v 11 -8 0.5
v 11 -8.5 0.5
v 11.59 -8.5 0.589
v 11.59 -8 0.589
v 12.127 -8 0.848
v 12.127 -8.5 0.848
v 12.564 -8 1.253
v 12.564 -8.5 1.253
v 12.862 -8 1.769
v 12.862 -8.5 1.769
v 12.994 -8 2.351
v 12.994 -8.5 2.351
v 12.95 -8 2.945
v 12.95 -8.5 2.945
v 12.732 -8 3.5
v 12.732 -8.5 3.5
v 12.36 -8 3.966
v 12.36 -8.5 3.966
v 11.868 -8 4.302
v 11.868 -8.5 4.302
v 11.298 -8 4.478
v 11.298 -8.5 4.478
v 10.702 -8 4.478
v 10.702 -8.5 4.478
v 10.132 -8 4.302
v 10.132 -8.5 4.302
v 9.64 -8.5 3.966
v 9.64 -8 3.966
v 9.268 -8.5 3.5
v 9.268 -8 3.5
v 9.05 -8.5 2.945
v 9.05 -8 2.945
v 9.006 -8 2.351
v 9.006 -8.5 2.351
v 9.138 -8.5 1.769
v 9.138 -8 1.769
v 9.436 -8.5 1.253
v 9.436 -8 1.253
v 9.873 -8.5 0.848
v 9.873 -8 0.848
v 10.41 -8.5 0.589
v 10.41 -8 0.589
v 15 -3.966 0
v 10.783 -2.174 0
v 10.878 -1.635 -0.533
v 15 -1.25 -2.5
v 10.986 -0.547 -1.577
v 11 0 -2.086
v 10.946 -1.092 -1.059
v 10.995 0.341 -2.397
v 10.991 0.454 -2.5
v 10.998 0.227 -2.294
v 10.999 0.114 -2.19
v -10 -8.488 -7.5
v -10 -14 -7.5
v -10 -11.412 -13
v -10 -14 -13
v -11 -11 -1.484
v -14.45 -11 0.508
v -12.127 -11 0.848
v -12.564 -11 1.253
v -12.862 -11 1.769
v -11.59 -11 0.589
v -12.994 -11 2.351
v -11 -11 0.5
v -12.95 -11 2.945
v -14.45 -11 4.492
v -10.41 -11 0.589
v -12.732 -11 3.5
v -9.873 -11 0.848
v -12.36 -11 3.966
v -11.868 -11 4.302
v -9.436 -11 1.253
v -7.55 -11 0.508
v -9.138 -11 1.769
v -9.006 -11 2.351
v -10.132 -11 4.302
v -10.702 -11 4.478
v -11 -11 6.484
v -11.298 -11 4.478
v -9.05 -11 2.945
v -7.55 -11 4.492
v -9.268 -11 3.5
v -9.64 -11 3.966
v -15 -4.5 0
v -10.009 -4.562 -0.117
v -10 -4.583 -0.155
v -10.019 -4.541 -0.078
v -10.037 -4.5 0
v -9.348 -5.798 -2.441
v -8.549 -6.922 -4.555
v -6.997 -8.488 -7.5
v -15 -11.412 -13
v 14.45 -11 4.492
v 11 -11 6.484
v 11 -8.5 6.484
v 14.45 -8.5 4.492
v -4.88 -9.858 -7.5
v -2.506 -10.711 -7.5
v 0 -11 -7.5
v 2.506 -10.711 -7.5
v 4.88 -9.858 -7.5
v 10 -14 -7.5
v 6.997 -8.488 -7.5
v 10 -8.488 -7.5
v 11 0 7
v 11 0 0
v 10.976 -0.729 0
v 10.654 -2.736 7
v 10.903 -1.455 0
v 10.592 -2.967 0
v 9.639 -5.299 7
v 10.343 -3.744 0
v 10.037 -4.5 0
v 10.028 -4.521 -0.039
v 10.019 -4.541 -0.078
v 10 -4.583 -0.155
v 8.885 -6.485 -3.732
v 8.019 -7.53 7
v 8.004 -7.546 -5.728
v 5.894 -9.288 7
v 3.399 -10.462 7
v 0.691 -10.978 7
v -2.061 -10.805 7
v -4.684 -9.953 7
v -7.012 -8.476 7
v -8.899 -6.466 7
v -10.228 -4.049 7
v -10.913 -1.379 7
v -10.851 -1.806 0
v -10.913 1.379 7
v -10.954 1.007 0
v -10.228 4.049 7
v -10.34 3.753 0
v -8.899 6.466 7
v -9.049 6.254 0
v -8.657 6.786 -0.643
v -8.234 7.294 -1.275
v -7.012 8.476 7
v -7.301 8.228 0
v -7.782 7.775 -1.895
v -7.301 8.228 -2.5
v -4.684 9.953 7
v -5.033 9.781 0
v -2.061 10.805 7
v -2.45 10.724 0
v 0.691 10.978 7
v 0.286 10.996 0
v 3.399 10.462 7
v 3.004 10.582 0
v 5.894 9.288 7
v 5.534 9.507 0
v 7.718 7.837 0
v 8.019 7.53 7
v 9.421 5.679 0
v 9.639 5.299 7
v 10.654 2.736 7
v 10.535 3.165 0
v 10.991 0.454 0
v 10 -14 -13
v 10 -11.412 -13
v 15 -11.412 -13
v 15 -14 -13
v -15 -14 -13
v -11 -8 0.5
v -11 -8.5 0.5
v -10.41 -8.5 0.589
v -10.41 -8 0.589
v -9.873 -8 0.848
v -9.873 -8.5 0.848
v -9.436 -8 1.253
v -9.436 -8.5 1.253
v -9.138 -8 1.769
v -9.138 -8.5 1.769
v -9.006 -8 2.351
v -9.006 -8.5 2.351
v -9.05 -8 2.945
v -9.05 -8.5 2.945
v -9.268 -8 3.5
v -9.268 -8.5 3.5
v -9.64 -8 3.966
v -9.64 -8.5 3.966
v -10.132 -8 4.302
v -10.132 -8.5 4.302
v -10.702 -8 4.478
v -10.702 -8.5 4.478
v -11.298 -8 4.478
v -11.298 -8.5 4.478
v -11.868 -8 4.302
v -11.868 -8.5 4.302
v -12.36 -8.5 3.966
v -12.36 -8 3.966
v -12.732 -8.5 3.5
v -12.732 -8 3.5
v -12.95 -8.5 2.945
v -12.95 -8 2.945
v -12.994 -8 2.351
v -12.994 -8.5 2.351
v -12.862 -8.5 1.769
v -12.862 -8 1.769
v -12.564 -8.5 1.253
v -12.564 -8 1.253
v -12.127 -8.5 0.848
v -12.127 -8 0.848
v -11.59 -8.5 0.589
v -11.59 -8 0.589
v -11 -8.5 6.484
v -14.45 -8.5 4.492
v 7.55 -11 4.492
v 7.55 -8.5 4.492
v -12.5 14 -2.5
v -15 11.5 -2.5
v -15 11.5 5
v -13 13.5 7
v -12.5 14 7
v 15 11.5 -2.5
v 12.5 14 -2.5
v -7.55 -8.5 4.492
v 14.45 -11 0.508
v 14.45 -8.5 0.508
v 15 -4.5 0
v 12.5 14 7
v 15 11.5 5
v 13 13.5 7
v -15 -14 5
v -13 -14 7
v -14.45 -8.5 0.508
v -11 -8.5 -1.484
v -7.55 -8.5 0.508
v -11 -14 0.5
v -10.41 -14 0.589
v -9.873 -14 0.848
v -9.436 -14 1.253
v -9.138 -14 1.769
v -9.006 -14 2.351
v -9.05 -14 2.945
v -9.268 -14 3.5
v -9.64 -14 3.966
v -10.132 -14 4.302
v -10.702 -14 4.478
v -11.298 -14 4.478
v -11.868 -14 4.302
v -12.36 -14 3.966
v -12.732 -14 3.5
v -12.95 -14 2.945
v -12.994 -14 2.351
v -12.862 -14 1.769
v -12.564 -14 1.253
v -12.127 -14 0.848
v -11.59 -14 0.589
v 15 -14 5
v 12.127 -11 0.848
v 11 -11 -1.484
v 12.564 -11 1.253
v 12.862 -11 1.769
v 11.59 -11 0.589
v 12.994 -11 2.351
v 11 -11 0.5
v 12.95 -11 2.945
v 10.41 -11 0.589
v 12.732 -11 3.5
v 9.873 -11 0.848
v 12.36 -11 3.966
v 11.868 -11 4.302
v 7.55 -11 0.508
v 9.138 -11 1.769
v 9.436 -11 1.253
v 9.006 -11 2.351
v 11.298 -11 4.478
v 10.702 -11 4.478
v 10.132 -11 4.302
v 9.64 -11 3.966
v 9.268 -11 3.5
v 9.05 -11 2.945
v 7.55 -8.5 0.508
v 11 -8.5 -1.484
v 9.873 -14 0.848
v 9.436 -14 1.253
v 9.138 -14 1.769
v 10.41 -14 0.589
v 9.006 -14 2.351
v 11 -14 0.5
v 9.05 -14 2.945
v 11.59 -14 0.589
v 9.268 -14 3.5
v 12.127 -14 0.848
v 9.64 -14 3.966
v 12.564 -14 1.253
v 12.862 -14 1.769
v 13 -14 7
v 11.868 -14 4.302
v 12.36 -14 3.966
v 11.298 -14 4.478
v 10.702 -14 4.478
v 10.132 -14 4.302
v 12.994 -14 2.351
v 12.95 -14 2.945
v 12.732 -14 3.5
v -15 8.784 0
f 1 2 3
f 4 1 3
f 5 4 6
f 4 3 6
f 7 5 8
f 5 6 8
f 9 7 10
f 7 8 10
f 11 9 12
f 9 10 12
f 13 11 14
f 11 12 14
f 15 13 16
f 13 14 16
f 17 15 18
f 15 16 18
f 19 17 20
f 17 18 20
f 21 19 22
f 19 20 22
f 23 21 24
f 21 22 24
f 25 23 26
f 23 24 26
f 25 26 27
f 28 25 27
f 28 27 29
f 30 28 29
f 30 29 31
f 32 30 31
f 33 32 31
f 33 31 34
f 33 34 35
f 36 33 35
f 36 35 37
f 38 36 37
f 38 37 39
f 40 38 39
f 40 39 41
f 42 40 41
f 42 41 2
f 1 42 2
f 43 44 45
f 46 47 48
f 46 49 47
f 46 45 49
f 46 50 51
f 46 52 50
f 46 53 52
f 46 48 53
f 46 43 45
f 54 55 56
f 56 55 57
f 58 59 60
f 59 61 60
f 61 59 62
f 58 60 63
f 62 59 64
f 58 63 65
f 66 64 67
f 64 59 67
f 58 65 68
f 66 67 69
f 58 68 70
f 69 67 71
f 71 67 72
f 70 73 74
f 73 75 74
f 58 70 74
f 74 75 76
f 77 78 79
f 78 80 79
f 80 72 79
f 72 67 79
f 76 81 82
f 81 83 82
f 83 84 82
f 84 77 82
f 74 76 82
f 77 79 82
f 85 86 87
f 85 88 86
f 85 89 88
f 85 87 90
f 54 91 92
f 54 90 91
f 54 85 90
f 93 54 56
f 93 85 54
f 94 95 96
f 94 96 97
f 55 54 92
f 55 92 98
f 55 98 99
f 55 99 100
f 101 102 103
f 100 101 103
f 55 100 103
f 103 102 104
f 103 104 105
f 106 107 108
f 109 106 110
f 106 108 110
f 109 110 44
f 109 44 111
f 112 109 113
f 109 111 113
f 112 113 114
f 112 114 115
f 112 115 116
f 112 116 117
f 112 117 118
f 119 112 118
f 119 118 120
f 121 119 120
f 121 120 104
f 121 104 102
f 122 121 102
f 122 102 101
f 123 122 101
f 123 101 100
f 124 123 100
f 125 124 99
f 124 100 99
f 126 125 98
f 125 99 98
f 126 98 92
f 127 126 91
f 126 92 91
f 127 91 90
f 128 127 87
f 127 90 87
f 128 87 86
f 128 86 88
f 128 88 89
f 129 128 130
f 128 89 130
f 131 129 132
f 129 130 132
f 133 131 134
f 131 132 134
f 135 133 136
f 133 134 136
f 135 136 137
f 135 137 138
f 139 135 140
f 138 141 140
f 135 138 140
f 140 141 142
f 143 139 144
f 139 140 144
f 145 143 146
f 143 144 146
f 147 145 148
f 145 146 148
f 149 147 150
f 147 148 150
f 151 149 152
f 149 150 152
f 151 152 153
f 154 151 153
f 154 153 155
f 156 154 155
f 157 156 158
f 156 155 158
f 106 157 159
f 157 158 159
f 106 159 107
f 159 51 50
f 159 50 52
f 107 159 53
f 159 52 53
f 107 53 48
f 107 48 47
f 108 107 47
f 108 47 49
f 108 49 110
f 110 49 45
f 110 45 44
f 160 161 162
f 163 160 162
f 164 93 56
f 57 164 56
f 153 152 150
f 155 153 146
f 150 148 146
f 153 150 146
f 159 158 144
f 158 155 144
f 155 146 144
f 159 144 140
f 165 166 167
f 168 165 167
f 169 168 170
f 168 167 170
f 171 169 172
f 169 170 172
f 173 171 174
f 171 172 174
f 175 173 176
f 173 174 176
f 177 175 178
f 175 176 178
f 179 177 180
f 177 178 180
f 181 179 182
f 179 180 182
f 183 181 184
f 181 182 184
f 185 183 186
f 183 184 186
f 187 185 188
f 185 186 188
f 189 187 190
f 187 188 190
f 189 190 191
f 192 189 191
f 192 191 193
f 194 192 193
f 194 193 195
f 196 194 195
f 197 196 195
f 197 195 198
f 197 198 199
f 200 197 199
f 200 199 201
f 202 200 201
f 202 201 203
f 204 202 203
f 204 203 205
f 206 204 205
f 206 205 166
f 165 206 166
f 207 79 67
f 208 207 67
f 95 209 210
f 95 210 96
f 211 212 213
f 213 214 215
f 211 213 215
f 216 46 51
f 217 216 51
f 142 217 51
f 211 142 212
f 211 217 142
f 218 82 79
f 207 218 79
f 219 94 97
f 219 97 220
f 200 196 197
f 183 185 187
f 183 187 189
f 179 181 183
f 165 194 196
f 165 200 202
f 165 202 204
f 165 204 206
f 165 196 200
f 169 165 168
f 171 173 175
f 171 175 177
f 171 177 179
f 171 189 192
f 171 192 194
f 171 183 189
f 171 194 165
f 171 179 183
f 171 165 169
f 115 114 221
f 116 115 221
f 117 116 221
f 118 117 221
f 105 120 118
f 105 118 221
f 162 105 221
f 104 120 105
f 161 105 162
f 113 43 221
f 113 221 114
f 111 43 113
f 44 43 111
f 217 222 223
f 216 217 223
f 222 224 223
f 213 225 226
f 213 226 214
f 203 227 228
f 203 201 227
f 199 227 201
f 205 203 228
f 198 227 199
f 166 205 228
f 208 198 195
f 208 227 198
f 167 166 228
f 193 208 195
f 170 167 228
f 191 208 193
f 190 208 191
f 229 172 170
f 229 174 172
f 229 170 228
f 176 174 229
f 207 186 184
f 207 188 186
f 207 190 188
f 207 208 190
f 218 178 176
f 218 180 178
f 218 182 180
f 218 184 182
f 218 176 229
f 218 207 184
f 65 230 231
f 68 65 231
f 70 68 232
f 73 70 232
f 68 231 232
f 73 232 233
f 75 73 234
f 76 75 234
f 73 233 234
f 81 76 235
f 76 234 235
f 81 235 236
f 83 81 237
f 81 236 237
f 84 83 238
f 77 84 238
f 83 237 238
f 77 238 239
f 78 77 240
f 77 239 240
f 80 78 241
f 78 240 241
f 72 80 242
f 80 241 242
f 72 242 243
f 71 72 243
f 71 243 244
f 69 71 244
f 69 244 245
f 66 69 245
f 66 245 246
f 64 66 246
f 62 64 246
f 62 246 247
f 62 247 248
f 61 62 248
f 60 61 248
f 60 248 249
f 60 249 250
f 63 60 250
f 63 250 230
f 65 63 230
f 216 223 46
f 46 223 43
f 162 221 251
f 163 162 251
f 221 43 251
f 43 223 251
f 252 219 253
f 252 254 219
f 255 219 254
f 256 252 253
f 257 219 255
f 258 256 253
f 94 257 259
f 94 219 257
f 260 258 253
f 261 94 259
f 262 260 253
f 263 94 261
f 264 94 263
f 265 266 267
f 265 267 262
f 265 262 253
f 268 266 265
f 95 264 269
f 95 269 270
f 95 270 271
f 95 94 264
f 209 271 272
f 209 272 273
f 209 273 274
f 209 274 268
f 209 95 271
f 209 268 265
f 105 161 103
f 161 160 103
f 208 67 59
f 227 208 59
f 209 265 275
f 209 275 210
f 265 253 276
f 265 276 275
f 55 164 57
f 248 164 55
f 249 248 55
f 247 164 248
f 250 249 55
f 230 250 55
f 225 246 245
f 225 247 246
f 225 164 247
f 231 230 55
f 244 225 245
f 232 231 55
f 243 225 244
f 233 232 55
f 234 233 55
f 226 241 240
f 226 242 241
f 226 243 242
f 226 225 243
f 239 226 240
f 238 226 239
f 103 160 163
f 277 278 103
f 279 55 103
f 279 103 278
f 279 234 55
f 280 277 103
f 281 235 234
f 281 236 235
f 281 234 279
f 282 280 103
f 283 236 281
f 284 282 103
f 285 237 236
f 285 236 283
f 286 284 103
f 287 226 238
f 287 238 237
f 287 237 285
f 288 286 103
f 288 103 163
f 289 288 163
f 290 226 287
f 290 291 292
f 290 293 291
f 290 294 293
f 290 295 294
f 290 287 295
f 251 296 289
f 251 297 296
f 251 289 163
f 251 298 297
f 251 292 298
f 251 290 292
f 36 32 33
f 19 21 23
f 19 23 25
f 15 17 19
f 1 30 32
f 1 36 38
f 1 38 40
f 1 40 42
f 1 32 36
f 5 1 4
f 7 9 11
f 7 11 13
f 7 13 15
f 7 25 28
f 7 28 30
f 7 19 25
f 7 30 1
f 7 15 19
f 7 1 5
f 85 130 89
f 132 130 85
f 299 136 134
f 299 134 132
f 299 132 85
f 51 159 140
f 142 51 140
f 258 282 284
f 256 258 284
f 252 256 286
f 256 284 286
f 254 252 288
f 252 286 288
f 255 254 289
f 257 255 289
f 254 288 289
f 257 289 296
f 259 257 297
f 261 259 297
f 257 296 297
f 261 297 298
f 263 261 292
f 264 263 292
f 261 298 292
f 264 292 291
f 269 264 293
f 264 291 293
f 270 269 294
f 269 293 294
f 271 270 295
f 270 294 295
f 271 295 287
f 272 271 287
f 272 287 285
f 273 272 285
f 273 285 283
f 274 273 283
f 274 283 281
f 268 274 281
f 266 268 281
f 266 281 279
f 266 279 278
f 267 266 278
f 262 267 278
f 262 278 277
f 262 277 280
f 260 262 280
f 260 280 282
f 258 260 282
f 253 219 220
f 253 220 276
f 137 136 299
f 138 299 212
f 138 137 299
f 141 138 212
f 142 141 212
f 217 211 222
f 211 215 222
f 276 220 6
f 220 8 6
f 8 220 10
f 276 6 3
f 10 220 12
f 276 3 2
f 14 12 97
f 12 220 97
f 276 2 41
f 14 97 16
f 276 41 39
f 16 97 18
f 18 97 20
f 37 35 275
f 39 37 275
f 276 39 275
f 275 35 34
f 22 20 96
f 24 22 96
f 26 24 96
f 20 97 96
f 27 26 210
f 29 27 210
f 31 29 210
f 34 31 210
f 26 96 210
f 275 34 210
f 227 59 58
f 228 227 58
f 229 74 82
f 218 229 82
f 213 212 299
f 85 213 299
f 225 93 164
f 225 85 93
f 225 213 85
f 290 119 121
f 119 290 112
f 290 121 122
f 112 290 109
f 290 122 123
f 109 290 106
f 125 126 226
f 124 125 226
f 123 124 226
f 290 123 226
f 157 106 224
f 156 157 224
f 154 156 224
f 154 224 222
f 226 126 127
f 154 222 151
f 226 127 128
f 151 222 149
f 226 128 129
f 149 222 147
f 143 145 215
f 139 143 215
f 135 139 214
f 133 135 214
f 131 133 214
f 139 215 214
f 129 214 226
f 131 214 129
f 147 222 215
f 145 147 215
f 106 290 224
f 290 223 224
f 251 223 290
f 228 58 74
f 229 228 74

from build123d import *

# Parameters (mm, degrees)
SKETCH1_R           = 11
BOSS_EXTRUDE1_DEPTH = 7
SKETCH2_W           = 5
SKETCH2_H           = 2.5
BOSS_EXTRUDE2_DEPTH = 13
CHAMFER2_SIZE       = 2
BOSS_EXTRUDE6_DEPTH = 2.5
CHAMFER3_SIZE       = 2
CHAMFER4_SIZE       = 2
BOSS_EXTRUDE4_DEPTH = 2.5
CHAMFER6_SIZE       = 2.5
CHAMFER7_SIZE       = 7
CHAMFER7_SIZE_2     = 13.165085257
CUT_EXTRUDE1_START  = -3
SKETCH6_R           = 2
CUT_EXTRUDE1_DEPTH  = 2.5
SKETCH7_R           = 2
CUT_EXTRUDE2_DEPTH  = 6


with BuildPart() as part:
    # Sketch1 → Boss-Extrude1 (new body)
    with BuildSketch(Plane.XY):
        Polygon((-15, 11.5), (-12.5, 14), (12.5, 14), (15, 11.5), (15, -14), (-15, -14), align=None)
        Circle(SKETCH1_R, mode=Mode.SUBTRACT)
    extrude(amount=BOSS_EXTRUDE1_DEPTH)

    # Sketch2 → Boss-Extrude2 (add)
    with BuildSketch(Plane(origin=(0, 0, 0), x_dir=(-1, 0, 0), z_dir=(0, 0, -1))):
        with Locations((-12.5, -12.75)):
            Rectangle(SKETCH2_W, SKETCH2_H)
        with Locations((12.5, -12.75)):
            Rectangle(SKETCH2_W, SKETCH2_H)
    extrude(amount=BOSS_EXTRUDE2_DEPTH)

    # Chamfer2
    chamfer2_edges = [part.edges().sort_by_distance(p)[0] for p in [
        (-10, -12.75, 0),
        (10, -12.75, 0),
    ]]
    chamfer(chamfer2_edges, length=CHAMFER2_SIZE)

    # Sketch5 → Boss-Extrude6 (add)
    with BuildSketch(Plane.XZ.offset(14)):
        Polygon((-10, -2), (-10, -7.5), (10, -7.5), (10, -2), (8, 0), (-8, 0), align=None)
    extrude(amount=-BOSS_EXTRUDE6_DEPTH)

    # Chamfer3
    chamfer3_edges = [part.edges().sort_by_distance(p)[0] for p in [
        (15, -1.25, 7),
    ]]
    chamfer(chamfer3_edges, length=CHAMFER3_SIZE)

    # Chamfer4
    chamfer4_edges = [part.edges().sort_by_distance(p)[0] for p in [
        (-15, -1.25, 7),
    ]]
    chamfer(chamfer4_edges, length=CHAMFER4_SIZE)

    # Sketch4 → Boss-Extrude4 (add)
    with BuildSketch(Plane(origin=(0, 0, 0), x_dir=(-1, 0, 0), z_dir=(0, 0, -1))):
        Polygon((-15, -1.25), (15, 11.5), (12.5, 14), (-12.5, 14), (-15, 11.5), align=None)
    extrude(amount=BOSS_EXTRUDE4_DEPTH)

    # Chamfer6
    # the kernel refuses this chamfer: 2.5 mm, written as the material it adds along each edge
    with BuildSketch(Plane(origin=(20.916998416, -3.764724327, 0), x_dir=(-0.39099275668343275, -0.9199829569021947, 0.02749587661058635), z_dir=(-0.9203309184584746, 0.39114064034485174, 0))) as chamfer6_piece_1_section:
        Polygon((CHAMFER6_SIZE * 0.999621916911, -CHAMFER6_SIZE * 0.0274958766106), (-CHAMFER6_SIZE * 0.0274958766106, -CHAMFER6_SIZE * 0.999621916911), (0, 0), align=None)
    chamfer6_piece_1 = extrude(amount=17.214861222, mode=Mode.PRIVATE)
    chamfer6_piece_1 = chamfer6_piece_1 - Plane(origin=(0, 0, -0.830769879), x_dir=(1, 0, 0), z_dir=(0, 0, -1)) * Cylinder(11, 45, mode=Mode.PRIVATE)
    chamfer6_piece_1 = split(chamfer6_piece_1, bisect_by=Plane(origin=(15, -1.305255327, -0.830769879), z_dir=(-1, 0, 0)), keep=Keep.TOP, mode=Mode.PRIVATE)
    add(chamfer6_piece_1)
    with BuildSketch(Plane(origin=(-1.383846422, 5.71313473, 0), x_dir=(-0.39099275668343275, -0.9199829569021946, 0.02749587661058637), z_dir=(-0.9203309184584746, 0.39114064034485174, 0))) as chamfer6_piece_2_section:
        Polygon((CHAMFER6_SIZE * 0.999621916911, -CHAMFER6_SIZE * 0.0274958766106), (-CHAMFER6_SIZE * 0.0274958766106, -CHAMFER6_SIZE * 0.999621916911), (0, 0), align=None)
    chamfer6_piece_2 = extrude(amount=21.224052785, mode=Mode.PRIVATE)
    chamfer6_piece_2 = chamfer6_piece_2 - Plane(origin=(0, 0, -0.851096237), x_dir=(1, 0, 0), z_dir=(0, 0, -1)) * Cylinder(11, 53, mode=Mode.PRIVATE)
    chamfer6_piece_2 = split(chamfer6_piece_2, bisect_by=Plane(origin=(-15, 9.126408424, -0.851096237), z_dir=(1, 0, 0)), keep=Keep.TOP, mode=Mode.PRIVATE)
    add(chamfer6_piece_2)

    # Chamfer7
    # the kernel refuses this chamfer: 13.165085257, 7 mm, written as the material it adds along each edge
    with BuildSketch(Plane(origin=(-15, -11.5, 0), x_dir=(0, 0.9979482451756082, 0.06402577567608186), z_dir=(1, 0, 0))) as chamfer7_piece_1_section:
        Polygon((CHAMFER7_SIZE * 0.997948245176, -CHAMFER7_SIZE * 0.0640257756761), (-CHAMFER7_SIZE_2 * 0.0640257756781, -CHAMFER7_SIZE_2 * 0.997948245208), (0, 0), align=None)
    chamfer7_piece_1 = extrude(amount=30, mode=Mode.PRIVATE)
    chamfer7_piece_1 = chamfer7_piece_1 - Plane(origin=(0, 0, -3.073682767), x_dir=(1, 0, 0), z_dir=(0, 0, -1)) * Cylinder(11, 113, mode=Mode.PRIVATE)
    chamfer7_piece_1 = split(chamfer7_piece_1, bisect_by=Plane(origin=(-12.500128058, -8.887755394, -7.5), z_dir=(0, 0, 1)), keep=Keep.TOP, mode=Mode.PRIVATE)
    chamfer7_piece_1 = split(chamfer7_piece_1, bisect_by=Plane(origin=(-10, -8.887755394, -3.073682767), z_dir=(-1, 0, 0)), keep=Keep.TOP, mode=Mode.PRIVATE)
    add(chamfer7_piece_1)
    with BuildSketch(Plane(origin=(-15, -11.5, 0), x_dir=(0, 0.9979482451756082, 0.06402577567608186), z_dir=(1, 0, 0))) as chamfer7_piece_2_section:
        Polygon((CHAMFER7_SIZE * 0.997948245176, -CHAMFER7_SIZE * 0.0640257756761), (-CHAMFER7_SIZE_2 * 0.0640257756781, -CHAMFER7_SIZE_2 * 0.997948245208), (0, 0), align=None)
    chamfer7_piece_2 = extrude(amount=30, mode=Mode.PRIVATE)
    chamfer7_piece_2 = split(chamfer7_piece_2, bisect_by=Plane(origin=(-12.5, -10.721530873, -7.5), z_dir=(0, 0, -1)), keep=Keep.TOP, mode=Mode.PRIVATE)
    chamfer7_piece_2 = split(chamfer7_piece_2, bisect_by=Plane(origin=(-10, -10.721530873, -9.597564575), z_dir=(-1, 0, 0)), keep=Keep.TOP, mode=Mode.PRIVATE)
    chamfer7_piece_2 = split(chamfer7_piece_2, bisect_by=Plane(origin=(-12.5, -10.721530873, -13), z_dir=(0, 0, 1)), keep=Keep.TOP, mode=Mode.PRIVATE)
    add(chamfer7_piece_2)
    with BuildSketch(Plane(origin=(-15, -11.5, 0), x_dir=(0, 0.9979482451756082, 0.06402577567608186), z_dir=(1, 0, 0))) as chamfer7_piece_3_section:
        Polygon((CHAMFER7_SIZE * 0.997948245176, -CHAMFER7_SIZE * 0.0640257756761), (-CHAMFER7_SIZE_2 * 0.0640257756781, -CHAMFER7_SIZE_2 * 0.997948245208), (0, 0), align=None)
    chamfer7_piece_3 = extrude(amount=30, mode=Mode.PRIVATE)
    chamfer7_piece_3 = chamfer7_piece_3 - Plane(origin=(0, 0, -3.793876077), x_dir=(1, 0, 0), z_dir=(0, 0, -1)) * Cylinder(11, 113, mode=Mode.PRIVATE)
    chamfer7_piece_3 = split(chamfer7_piece_3, bisect_by=Plane(origin=(-9.499486782, -6.598719884, -7.5), z_dir=(0, 0, 1)), keep=Keep.TOP, mode=Mode.PRIVATE)
    chamfer7_piece_3 = split(chamfer7_piece_3, bisect_by=Plane(origin=(10, -6.598719884, -3.793876077), z_dir=(-1, 0, 0)), keep=Keep.TOP, mode=Mode.PRIVATE)
    chamfer7_piece_3 = split(chamfer7_piece_3, bisect_by=Plane(origin=(-10, -6.598719884, -3.793876077), z_dir=(1, 0, 0)), keep=Keep.TOP, mode=Mode.PRIVATE)
    add(chamfer7_piece_3)
    with BuildSketch(Plane(origin=(-15, -11.5, 0), x_dir=(0, 0.9979482451756082, 0.06402577567608186), z_dir=(1, 0, 0))) as chamfer7_piece_4_section:
        Polygon((CHAMFER7_SIZE * 0.997948245176, -CHAMFER7_SIZE * 0.0640257756761), (-CHAMFER7_SIZE_2 * 0.0640257756781, -CHAMFER7_SIZE_2 * 0.997948245208), (0, 0), align=None)
    chamfer7_piece_4 = extrude(amount=30, mode=Mode.PRIVATE)
    chamfer7_piece_4 = split(chamfer7_piece_4, bisect_by=Plane(origin=(12.5, -10.721530873, -7.5), z_dir=(0, 0, -1)), keep=Keep.TOP, mode=Mode.PRIVATE)
    chamfer7_piece_4 = split(chamfer7_piece_4, bisect_by=Plane(origin=(10, -10.721530873, -9.597564575), z_dir=(1, 0, 0)), keep=Keep.TOP, mode=Mode.PRIVATE)
    chamfer7_piece_4 = split(chamfer7_piece_4, bisect_by=Plane(origin=(12.5, -10.721530873, -13), z_dir=(0, 0, 1)), keep=Keep.TOP, mode=Mode.PRIVATE)
    add(chamfer7_piece_4)
    with BuildSketch(Plane(origin=(-15, -11.5, 0), x_dir=(0, 0.9979482451756082, 0.06402577567608186), z_dir=(1, 0, 0))) as chamfer7_piece_5_section:
        Polygon((CHAMFER7_SIZE * 0.997948245176, -CHAMFER7_SIZE * 0.0640257756761), (-CHAMFER7_SIZE_2 * 0.0640257756781, -CHAMFER7_SIZE_2 * 0.997948245208), (0, 0), align=None)
    chamfer7_piece_5 = extrude(amount=30, mode=Mode.PRIVATE)
    chamfer7_piece_5 = chamfer7_piece_5 - Plane(origin=(0, 0, -3.073682766), x_dir=(1, 0, 0), z_dir=(0, 0, -1)) * Cylinder(11, 113, mode=Mode.PRIVATE)
    chamfer7_piece_5 = split(chamfer7_piece_5, bisect_by=Plane(origin=(12.500128057, -8.887755394, -7.5), z_dir=(0, 0, 1)), keep=Keep.TOP, mode=Mode.PRIVATE)
    chamfer7_piece_5 = split(chamfer7_piece_5, bisect_by=Plane(origin=(10, -8.887755394, -3.073682766), z_dir=(1, 0, 0)), keep=Keep.TOP, mode=Mode.PRIVATE)
    add(chamfer7_piece_5)

    # Sketch6 → Cut-Extrude1 (cut)
    # profile 1 of 2: a face of its own
    with BuildSketch(Plane.XZ.offset(14).offset(CUT_EXTRUDE1_START)):
        Polygon((-7.55, 0.508141571), (-7.55, 4.491858429), (-11, 6.483716857), (-14.45, 4.491858429), (-14.45, 0.508141571), (-11, -1.483716857), align=None)
        with Locations(Location((-11, 2.5, 0), (0, 0, 270))):
            Circle(SKETCH6_R, mode=Mode.SUBTRACT)
    # profile 2 of 2: a face of its own
    with BuildSketch(Plane.XZ.offset(14).offset(CUT_EXTRUDE1_START)):
        Polygon((11, -1.483716857), (7.55, 0.508141571), (7.55, 4.491858429), (11, 6.483716857), (14.45, 4.491858429), (14.45, 0.508141571), align=None)
    extrude(amount=-CUT_EXTRUDE1_DEPTH, mode=Mode.SUBTRACT)

    # Sketch7 → Cut-Extrude2 (cut)
    with BuildSketch(Plane.XZ.offset(14)):
        with Locations(Location((11, 2.5, 0), (0, 0, 270))):
            Circle(SKETCH7_R)
        with Locations(Location((-11, 2.5, 0), (0, 0, 270))):
            Circle(SKETCH7_R)
    extrude(amount=-CUT_EXTRUDE2_DEPTH, mode=Mode.SUBTRACT)


solid = part.part
